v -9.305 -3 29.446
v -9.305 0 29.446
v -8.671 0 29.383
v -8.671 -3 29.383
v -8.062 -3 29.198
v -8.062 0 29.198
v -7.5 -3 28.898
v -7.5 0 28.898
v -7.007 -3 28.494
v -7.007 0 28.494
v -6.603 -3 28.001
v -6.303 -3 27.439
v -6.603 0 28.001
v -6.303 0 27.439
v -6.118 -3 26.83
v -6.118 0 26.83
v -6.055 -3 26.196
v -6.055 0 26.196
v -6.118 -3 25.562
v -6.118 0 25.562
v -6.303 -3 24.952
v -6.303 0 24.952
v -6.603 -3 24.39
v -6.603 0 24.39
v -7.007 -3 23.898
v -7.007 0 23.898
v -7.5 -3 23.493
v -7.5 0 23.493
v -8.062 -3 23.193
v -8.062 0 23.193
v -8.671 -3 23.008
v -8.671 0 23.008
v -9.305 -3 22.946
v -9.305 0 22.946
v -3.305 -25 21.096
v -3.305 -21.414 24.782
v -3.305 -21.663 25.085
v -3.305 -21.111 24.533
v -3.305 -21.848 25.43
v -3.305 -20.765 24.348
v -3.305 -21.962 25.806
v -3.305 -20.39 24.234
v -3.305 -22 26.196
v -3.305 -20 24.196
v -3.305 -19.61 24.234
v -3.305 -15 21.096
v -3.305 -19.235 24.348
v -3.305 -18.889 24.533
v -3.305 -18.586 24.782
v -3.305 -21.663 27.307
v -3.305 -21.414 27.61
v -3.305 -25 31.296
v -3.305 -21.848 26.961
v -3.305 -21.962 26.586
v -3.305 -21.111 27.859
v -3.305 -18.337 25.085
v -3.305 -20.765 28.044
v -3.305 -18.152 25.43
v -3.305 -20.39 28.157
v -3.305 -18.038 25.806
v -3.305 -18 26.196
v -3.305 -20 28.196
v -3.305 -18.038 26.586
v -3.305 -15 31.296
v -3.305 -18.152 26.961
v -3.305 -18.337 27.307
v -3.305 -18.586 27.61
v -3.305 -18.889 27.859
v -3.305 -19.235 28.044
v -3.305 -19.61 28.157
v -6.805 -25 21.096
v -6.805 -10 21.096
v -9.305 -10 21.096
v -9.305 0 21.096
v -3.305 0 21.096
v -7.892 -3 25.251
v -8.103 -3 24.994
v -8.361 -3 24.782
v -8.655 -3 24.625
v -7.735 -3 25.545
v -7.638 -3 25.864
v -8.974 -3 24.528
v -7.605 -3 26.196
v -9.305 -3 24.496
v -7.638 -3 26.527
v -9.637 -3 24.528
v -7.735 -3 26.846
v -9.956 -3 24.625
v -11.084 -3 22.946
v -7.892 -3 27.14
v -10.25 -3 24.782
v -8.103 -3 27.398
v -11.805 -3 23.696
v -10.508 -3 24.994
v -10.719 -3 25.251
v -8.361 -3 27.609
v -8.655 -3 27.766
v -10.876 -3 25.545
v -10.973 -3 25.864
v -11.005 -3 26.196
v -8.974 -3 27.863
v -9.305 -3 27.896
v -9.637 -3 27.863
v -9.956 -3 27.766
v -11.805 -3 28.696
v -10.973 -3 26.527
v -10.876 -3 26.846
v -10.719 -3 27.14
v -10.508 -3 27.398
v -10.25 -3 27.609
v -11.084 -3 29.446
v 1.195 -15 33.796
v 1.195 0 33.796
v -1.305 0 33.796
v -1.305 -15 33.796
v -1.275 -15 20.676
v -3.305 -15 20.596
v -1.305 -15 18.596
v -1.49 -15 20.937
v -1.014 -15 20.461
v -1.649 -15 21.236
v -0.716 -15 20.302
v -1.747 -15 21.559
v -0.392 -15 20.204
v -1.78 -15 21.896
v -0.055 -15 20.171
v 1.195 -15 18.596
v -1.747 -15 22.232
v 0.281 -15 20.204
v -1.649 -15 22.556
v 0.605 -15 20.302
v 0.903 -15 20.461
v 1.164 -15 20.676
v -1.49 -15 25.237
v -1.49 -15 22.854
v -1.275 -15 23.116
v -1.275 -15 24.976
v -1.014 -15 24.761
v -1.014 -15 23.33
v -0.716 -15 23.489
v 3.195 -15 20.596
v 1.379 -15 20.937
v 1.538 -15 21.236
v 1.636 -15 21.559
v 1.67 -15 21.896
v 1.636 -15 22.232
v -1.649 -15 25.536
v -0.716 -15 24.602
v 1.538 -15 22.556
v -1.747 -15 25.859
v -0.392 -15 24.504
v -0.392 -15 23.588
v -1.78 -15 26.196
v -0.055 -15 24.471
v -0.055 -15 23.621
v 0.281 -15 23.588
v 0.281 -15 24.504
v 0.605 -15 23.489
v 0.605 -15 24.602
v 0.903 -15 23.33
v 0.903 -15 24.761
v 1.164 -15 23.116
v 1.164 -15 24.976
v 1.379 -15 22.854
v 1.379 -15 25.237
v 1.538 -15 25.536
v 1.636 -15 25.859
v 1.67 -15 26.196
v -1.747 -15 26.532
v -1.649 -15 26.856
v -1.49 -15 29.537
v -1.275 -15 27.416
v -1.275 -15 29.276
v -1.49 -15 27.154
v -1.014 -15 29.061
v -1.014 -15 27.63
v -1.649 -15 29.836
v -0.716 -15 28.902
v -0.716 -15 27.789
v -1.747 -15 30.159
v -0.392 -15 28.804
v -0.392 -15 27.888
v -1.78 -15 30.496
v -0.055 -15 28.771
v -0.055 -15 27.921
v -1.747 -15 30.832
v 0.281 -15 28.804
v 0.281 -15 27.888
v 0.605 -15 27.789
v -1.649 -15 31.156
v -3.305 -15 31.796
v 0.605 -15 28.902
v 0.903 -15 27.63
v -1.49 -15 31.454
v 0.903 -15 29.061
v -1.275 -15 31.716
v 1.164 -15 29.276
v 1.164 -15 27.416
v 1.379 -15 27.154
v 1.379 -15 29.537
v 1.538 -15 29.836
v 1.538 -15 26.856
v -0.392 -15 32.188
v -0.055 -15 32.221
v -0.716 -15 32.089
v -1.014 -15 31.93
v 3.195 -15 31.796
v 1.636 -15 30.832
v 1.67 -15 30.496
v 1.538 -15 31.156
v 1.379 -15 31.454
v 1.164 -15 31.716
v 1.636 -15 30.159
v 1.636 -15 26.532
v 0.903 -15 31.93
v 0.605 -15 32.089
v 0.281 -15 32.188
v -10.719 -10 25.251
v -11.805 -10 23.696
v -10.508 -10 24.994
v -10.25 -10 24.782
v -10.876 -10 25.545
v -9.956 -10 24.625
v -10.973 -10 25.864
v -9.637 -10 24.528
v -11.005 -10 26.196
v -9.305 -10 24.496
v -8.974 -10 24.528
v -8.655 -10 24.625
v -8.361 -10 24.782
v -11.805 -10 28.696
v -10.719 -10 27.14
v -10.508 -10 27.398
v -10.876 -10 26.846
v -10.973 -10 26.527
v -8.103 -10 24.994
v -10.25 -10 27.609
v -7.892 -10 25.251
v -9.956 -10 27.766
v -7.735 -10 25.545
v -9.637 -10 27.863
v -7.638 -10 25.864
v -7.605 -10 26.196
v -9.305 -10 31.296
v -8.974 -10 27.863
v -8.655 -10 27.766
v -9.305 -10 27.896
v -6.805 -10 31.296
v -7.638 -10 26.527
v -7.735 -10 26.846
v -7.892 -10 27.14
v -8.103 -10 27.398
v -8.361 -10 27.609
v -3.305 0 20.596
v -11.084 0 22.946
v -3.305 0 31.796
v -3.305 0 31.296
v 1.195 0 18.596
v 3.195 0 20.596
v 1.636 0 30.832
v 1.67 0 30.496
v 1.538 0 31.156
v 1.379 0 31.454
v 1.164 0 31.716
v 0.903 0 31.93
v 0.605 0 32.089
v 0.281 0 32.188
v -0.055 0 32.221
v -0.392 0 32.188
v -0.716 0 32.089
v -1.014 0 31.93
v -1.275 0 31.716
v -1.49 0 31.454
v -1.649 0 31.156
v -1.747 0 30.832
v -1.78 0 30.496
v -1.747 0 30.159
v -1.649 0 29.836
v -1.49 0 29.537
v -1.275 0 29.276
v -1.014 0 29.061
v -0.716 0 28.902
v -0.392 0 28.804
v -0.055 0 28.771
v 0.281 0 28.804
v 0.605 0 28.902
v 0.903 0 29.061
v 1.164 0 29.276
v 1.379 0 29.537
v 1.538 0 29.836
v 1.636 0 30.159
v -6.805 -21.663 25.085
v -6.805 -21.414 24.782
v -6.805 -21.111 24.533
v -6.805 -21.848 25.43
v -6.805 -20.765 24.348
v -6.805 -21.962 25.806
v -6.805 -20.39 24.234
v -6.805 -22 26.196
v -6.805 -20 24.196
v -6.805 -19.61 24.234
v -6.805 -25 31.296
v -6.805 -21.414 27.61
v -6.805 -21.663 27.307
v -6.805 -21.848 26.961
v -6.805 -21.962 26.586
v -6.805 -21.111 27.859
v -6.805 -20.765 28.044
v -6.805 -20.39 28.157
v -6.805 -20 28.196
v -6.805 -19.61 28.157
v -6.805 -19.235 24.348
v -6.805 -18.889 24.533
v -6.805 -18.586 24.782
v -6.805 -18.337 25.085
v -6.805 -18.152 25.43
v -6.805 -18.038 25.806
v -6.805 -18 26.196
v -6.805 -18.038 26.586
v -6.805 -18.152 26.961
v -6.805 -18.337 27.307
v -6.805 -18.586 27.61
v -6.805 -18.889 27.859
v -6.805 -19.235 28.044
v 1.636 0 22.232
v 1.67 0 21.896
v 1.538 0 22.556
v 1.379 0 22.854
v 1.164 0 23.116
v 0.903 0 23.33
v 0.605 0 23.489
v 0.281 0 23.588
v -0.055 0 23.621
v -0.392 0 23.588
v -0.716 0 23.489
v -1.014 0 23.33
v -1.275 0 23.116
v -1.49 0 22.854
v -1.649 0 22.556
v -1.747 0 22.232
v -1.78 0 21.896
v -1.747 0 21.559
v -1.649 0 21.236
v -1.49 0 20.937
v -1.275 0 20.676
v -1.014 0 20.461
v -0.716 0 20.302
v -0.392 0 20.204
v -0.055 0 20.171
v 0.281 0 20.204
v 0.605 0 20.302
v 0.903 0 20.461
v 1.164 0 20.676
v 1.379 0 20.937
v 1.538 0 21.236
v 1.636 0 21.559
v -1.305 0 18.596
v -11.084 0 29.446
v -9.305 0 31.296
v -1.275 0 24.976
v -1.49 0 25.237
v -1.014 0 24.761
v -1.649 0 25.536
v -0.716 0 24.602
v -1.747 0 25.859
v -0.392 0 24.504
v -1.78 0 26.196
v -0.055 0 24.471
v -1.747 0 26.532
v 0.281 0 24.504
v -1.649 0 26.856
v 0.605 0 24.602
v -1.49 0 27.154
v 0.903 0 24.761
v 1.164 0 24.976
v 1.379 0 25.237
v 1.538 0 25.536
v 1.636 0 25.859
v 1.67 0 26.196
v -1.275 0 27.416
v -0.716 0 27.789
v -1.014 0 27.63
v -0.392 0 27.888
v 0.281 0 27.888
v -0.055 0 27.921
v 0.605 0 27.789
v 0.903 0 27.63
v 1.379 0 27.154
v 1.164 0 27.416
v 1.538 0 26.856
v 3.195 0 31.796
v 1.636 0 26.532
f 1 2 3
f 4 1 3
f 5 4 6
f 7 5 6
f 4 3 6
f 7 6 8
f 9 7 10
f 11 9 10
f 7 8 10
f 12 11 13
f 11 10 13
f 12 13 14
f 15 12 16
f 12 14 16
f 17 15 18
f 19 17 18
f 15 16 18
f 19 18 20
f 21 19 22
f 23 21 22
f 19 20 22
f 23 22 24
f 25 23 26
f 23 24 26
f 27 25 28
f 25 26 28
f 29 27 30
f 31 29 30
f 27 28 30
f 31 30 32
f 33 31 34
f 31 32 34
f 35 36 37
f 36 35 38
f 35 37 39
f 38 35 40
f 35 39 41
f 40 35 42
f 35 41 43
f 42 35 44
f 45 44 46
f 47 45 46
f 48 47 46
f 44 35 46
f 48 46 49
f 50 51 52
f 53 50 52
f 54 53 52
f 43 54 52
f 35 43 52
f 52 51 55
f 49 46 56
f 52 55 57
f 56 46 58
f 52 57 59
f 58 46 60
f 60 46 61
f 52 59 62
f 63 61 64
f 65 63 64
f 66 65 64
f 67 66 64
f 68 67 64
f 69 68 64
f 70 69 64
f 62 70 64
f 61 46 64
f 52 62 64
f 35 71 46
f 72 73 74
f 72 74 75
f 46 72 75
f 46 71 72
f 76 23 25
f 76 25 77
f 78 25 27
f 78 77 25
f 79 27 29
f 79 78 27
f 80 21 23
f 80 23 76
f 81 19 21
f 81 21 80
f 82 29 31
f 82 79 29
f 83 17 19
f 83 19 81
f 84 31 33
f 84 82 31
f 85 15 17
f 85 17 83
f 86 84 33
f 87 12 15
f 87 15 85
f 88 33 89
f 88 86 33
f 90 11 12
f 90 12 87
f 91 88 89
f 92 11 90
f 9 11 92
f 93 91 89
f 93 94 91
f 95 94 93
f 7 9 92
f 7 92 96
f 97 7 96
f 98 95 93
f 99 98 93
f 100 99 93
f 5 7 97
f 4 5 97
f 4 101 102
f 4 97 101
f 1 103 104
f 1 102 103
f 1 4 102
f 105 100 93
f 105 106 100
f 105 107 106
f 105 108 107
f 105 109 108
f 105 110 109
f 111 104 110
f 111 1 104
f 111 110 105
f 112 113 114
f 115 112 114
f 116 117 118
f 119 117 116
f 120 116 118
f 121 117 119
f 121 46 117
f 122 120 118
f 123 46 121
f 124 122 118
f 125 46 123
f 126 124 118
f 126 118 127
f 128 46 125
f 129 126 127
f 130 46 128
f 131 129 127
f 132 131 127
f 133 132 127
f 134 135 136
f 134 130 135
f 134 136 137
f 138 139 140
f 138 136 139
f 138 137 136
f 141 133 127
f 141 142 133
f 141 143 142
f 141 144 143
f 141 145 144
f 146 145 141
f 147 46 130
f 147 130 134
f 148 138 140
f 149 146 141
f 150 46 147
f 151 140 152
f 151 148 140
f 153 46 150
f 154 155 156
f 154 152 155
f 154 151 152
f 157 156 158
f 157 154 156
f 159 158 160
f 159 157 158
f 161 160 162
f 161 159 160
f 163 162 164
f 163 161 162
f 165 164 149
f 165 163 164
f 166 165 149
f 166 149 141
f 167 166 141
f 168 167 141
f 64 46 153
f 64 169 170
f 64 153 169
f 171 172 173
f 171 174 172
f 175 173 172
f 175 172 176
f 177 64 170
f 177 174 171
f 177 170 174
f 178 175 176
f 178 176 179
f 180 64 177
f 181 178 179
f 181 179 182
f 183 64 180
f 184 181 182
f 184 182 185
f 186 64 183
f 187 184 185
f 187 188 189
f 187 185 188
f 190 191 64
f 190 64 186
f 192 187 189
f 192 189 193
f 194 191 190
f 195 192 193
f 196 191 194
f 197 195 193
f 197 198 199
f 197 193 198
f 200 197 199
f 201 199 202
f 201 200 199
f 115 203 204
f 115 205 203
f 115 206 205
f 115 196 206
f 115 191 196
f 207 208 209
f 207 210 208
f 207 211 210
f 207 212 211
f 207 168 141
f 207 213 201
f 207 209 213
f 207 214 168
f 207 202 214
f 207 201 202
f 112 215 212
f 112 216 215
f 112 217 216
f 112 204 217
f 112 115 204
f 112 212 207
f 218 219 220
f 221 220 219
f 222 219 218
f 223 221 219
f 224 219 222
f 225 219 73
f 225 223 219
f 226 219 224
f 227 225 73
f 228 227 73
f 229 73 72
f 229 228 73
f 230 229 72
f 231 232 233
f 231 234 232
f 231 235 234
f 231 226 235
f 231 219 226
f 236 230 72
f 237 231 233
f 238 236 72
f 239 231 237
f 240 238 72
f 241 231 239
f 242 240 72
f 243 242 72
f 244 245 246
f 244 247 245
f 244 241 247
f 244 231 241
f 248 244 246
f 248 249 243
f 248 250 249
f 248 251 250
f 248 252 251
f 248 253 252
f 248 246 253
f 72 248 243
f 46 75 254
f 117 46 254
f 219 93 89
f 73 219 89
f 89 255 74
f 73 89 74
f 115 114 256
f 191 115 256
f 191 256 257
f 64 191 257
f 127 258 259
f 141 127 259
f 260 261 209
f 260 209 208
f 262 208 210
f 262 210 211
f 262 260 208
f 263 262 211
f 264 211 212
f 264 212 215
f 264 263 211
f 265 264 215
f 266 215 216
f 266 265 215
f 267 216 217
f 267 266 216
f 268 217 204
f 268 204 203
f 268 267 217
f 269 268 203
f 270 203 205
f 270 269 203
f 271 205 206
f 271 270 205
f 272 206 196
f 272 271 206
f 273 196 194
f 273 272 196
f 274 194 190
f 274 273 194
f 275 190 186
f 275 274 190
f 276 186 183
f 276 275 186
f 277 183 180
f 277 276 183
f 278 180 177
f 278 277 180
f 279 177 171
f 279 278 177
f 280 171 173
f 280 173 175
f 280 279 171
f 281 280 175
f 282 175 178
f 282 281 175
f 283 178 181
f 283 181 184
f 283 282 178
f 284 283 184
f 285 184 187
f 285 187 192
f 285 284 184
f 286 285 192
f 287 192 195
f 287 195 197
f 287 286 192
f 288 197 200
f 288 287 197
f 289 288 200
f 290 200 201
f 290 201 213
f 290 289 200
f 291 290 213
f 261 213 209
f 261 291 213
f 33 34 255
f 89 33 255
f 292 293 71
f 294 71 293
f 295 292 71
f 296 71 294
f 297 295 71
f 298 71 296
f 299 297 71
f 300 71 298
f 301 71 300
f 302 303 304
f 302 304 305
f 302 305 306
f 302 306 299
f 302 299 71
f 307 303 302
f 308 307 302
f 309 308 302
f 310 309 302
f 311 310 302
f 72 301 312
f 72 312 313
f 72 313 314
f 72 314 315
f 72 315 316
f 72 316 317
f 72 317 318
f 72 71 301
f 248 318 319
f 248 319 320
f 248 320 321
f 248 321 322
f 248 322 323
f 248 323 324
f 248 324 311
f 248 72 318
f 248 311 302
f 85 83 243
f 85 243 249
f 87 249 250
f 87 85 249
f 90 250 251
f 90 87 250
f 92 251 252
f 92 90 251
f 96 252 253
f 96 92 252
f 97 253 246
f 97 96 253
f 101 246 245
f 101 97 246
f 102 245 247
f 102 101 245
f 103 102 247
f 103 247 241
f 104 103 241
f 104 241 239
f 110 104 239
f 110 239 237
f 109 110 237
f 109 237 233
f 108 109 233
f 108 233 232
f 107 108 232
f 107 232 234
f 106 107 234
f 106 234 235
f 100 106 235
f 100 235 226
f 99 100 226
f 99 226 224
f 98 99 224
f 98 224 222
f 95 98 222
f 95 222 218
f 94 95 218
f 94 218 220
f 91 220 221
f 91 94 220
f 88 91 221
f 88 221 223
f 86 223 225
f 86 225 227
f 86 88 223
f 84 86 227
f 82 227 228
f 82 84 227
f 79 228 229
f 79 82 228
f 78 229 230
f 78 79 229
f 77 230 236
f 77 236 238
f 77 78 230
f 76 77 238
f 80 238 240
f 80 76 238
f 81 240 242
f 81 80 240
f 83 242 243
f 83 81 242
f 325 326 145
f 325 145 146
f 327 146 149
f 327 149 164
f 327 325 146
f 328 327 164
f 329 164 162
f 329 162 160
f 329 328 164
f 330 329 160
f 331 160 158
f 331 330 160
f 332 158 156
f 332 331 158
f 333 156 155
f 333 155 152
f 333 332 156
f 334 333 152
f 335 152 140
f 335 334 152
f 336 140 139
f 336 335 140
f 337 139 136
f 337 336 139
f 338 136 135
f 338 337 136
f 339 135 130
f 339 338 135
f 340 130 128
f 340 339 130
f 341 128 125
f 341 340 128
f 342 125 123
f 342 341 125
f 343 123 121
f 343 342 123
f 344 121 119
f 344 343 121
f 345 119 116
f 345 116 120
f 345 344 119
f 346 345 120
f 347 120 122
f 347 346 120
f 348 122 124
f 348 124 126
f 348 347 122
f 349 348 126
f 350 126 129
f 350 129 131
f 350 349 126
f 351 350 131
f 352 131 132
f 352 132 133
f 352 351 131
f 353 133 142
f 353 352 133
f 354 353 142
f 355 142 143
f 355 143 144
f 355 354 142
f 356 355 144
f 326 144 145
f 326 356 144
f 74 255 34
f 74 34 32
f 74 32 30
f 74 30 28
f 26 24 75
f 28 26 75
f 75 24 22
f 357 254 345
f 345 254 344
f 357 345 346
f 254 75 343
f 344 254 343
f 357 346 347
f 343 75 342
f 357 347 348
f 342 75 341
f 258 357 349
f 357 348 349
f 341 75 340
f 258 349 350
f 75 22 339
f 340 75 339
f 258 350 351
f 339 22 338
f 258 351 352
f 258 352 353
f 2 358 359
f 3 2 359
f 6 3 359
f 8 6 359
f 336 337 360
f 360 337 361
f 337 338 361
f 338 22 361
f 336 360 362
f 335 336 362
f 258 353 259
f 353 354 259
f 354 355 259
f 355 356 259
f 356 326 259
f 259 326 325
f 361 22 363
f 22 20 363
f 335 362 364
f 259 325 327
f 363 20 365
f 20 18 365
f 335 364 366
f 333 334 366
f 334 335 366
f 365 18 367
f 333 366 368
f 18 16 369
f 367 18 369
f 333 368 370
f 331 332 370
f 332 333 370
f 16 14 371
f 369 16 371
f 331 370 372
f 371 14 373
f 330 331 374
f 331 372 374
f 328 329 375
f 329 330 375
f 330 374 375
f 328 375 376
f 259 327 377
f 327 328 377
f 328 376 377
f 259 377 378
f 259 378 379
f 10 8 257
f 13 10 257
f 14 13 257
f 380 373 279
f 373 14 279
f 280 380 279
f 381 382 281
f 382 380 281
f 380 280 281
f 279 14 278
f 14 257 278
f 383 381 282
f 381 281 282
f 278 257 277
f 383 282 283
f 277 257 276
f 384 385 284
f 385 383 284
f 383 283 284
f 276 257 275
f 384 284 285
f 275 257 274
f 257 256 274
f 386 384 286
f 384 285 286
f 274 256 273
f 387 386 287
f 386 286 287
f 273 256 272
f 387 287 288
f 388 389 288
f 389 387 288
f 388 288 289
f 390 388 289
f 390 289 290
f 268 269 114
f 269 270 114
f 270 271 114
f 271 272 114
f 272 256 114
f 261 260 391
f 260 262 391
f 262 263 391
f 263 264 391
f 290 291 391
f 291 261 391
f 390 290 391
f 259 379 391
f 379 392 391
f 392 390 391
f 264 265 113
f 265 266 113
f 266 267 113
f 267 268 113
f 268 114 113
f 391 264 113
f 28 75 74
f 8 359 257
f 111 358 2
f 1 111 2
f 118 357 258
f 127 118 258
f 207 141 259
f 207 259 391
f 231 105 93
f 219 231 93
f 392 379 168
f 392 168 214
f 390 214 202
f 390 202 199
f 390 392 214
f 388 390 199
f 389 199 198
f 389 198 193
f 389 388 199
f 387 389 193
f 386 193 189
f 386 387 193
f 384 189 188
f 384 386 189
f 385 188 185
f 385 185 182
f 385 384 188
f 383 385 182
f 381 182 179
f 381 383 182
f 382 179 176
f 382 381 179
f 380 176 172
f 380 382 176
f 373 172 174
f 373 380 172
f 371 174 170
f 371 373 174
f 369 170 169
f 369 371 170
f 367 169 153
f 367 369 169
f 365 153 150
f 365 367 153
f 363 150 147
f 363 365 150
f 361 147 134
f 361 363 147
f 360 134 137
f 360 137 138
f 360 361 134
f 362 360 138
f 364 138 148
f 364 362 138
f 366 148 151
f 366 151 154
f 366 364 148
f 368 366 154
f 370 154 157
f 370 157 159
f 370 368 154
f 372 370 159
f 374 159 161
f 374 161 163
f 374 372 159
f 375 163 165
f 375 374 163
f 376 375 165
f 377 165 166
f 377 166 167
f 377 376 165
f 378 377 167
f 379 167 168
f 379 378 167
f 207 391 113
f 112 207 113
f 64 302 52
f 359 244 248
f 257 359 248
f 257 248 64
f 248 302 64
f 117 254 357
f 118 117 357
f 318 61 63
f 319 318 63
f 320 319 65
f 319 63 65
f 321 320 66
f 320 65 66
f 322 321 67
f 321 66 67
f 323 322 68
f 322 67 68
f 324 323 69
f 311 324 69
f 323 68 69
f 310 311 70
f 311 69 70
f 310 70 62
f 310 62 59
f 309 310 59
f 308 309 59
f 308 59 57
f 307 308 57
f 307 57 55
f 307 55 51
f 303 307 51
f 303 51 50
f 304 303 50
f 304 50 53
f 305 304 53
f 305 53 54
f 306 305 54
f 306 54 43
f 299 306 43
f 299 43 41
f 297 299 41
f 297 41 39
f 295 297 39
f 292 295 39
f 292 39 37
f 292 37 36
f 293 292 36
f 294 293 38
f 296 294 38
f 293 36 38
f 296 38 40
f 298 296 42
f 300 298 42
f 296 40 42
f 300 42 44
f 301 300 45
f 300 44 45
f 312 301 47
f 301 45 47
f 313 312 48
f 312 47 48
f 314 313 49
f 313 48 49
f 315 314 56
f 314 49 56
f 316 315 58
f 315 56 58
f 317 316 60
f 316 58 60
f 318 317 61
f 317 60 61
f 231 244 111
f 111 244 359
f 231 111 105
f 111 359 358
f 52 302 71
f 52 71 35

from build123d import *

# Parameters (mm, degrees)
F0_R     = 1.7
F0_R_2   = 1.725
F1_DEPTH = 15
F2_W     = 3.5
F2_H     = 10.2
F3_DEPTH = 10
F4_R     = 1.7
F5_DEPTH = 5
F6_R     = 2
F7_DEPTH = 25
F9_DEPTH = 3


with BuildPart() as f1:
    # F0 (on Front) → F1 (new body)
    with BuildSketch(Plane.XZ):
        Polygon((-3.305435, 21.095744), (-3.305435, 31.295744), (-9.305435, 31.295744), (-11.805435, 28.695744), (-11.805435, 23.695744), (-9.305435, 21.095744), align=None)
        with Locations((-9.305435, 26.195744)):
            Circle(F0_R, mode=Mode.SUBTRACT)
        Polygon((1.194565, 33.795744), (-1.305435, 33.795744), (-3.305435, 31.795744), (-3.305435, 31.295744), (-3.305435, 21.095744), (-3.305435, 20.595744), (-1.305435, 18.595744), (1.194565, 18.595744), (3.194565, 20.595744), (3.194565, 31.795744), align=None)
        with Locations((-0.055435, 21.895744)):
            Circle(F0_R_2, mode=Mode.SUBTRACT)
        with Locations((-0.055435, 26.195744)):
            Circle(F0_R_2, mode=Mode.SUBTRACT)
        with Locations((-0.055435, 30.495744)):
            Circle(F0_R_2, mode=Mode.SUBTRACT)
    extrude(amount=F1_DEPTH)

    # F2 (on face) → F3 (join)
    with BuildSketch(Plane.XZ.offset(15)):
        with Locations((-5.055435, 26.195744)):
            Rectangle(F2_W, F2_H)
    extrude(amount=F3_DEPTH)

    # F4 (on face) → F5 (cut)
    with BuildSketch(Plane.XZ.offset(15)):
        Polygon((-6.805435, 21.095744), (-6.805435, 31.295744), (-9.305435, 31.295744), (-11.805435, 28.695744), (-11.805435, 23.695744), (-9.305435, 21.095744), align=None)
        with Locations((-9.305435, 26.195744)):
            Circle(F4_R, mode=Mode.SUBTRACT)
    extrude(amount=-F5_DEPTH, mode=Mode.SUBTRACT)

    # F6 (on face) → F7 (cut)
    with BuildSketch(Plane.YZ.offset(-3.305435)):
        with Locations((-20, 26.195744)):
            Circle(F6_R)
    extrude(amount=-F7_DEPTH, mode=Mode.SUBTRACT)

    # F8 (on face) → F9 (cut)
    with BuildSketch(Plane(origin=(0, 0, 0), x_dir=(-1, 0, 0), z_dir=(0, 1, 0))):
        with BuildLine():
            Line((11.084282, 29.445744), (9.305435, 29.445744))
            ThreePointArc((9.305435, 29.445744), (6.055435, 26.195744), (9.305435, 22.945744))
            Line((9.305435, 22.945744), (11.084282, 22.945744))
            Line((11.084282, 22.945744), (11.805435, 23.695744))
            Line((11.805435, 23.695744), (11.805435, 28.695744))
            Line((11.805435, 28.695744), (11.084282, 29.445744))
        make_face()
    extrude(amount=-F9_DEPTH, mode=Mode.SUBTRACT)


solid = f1.part
